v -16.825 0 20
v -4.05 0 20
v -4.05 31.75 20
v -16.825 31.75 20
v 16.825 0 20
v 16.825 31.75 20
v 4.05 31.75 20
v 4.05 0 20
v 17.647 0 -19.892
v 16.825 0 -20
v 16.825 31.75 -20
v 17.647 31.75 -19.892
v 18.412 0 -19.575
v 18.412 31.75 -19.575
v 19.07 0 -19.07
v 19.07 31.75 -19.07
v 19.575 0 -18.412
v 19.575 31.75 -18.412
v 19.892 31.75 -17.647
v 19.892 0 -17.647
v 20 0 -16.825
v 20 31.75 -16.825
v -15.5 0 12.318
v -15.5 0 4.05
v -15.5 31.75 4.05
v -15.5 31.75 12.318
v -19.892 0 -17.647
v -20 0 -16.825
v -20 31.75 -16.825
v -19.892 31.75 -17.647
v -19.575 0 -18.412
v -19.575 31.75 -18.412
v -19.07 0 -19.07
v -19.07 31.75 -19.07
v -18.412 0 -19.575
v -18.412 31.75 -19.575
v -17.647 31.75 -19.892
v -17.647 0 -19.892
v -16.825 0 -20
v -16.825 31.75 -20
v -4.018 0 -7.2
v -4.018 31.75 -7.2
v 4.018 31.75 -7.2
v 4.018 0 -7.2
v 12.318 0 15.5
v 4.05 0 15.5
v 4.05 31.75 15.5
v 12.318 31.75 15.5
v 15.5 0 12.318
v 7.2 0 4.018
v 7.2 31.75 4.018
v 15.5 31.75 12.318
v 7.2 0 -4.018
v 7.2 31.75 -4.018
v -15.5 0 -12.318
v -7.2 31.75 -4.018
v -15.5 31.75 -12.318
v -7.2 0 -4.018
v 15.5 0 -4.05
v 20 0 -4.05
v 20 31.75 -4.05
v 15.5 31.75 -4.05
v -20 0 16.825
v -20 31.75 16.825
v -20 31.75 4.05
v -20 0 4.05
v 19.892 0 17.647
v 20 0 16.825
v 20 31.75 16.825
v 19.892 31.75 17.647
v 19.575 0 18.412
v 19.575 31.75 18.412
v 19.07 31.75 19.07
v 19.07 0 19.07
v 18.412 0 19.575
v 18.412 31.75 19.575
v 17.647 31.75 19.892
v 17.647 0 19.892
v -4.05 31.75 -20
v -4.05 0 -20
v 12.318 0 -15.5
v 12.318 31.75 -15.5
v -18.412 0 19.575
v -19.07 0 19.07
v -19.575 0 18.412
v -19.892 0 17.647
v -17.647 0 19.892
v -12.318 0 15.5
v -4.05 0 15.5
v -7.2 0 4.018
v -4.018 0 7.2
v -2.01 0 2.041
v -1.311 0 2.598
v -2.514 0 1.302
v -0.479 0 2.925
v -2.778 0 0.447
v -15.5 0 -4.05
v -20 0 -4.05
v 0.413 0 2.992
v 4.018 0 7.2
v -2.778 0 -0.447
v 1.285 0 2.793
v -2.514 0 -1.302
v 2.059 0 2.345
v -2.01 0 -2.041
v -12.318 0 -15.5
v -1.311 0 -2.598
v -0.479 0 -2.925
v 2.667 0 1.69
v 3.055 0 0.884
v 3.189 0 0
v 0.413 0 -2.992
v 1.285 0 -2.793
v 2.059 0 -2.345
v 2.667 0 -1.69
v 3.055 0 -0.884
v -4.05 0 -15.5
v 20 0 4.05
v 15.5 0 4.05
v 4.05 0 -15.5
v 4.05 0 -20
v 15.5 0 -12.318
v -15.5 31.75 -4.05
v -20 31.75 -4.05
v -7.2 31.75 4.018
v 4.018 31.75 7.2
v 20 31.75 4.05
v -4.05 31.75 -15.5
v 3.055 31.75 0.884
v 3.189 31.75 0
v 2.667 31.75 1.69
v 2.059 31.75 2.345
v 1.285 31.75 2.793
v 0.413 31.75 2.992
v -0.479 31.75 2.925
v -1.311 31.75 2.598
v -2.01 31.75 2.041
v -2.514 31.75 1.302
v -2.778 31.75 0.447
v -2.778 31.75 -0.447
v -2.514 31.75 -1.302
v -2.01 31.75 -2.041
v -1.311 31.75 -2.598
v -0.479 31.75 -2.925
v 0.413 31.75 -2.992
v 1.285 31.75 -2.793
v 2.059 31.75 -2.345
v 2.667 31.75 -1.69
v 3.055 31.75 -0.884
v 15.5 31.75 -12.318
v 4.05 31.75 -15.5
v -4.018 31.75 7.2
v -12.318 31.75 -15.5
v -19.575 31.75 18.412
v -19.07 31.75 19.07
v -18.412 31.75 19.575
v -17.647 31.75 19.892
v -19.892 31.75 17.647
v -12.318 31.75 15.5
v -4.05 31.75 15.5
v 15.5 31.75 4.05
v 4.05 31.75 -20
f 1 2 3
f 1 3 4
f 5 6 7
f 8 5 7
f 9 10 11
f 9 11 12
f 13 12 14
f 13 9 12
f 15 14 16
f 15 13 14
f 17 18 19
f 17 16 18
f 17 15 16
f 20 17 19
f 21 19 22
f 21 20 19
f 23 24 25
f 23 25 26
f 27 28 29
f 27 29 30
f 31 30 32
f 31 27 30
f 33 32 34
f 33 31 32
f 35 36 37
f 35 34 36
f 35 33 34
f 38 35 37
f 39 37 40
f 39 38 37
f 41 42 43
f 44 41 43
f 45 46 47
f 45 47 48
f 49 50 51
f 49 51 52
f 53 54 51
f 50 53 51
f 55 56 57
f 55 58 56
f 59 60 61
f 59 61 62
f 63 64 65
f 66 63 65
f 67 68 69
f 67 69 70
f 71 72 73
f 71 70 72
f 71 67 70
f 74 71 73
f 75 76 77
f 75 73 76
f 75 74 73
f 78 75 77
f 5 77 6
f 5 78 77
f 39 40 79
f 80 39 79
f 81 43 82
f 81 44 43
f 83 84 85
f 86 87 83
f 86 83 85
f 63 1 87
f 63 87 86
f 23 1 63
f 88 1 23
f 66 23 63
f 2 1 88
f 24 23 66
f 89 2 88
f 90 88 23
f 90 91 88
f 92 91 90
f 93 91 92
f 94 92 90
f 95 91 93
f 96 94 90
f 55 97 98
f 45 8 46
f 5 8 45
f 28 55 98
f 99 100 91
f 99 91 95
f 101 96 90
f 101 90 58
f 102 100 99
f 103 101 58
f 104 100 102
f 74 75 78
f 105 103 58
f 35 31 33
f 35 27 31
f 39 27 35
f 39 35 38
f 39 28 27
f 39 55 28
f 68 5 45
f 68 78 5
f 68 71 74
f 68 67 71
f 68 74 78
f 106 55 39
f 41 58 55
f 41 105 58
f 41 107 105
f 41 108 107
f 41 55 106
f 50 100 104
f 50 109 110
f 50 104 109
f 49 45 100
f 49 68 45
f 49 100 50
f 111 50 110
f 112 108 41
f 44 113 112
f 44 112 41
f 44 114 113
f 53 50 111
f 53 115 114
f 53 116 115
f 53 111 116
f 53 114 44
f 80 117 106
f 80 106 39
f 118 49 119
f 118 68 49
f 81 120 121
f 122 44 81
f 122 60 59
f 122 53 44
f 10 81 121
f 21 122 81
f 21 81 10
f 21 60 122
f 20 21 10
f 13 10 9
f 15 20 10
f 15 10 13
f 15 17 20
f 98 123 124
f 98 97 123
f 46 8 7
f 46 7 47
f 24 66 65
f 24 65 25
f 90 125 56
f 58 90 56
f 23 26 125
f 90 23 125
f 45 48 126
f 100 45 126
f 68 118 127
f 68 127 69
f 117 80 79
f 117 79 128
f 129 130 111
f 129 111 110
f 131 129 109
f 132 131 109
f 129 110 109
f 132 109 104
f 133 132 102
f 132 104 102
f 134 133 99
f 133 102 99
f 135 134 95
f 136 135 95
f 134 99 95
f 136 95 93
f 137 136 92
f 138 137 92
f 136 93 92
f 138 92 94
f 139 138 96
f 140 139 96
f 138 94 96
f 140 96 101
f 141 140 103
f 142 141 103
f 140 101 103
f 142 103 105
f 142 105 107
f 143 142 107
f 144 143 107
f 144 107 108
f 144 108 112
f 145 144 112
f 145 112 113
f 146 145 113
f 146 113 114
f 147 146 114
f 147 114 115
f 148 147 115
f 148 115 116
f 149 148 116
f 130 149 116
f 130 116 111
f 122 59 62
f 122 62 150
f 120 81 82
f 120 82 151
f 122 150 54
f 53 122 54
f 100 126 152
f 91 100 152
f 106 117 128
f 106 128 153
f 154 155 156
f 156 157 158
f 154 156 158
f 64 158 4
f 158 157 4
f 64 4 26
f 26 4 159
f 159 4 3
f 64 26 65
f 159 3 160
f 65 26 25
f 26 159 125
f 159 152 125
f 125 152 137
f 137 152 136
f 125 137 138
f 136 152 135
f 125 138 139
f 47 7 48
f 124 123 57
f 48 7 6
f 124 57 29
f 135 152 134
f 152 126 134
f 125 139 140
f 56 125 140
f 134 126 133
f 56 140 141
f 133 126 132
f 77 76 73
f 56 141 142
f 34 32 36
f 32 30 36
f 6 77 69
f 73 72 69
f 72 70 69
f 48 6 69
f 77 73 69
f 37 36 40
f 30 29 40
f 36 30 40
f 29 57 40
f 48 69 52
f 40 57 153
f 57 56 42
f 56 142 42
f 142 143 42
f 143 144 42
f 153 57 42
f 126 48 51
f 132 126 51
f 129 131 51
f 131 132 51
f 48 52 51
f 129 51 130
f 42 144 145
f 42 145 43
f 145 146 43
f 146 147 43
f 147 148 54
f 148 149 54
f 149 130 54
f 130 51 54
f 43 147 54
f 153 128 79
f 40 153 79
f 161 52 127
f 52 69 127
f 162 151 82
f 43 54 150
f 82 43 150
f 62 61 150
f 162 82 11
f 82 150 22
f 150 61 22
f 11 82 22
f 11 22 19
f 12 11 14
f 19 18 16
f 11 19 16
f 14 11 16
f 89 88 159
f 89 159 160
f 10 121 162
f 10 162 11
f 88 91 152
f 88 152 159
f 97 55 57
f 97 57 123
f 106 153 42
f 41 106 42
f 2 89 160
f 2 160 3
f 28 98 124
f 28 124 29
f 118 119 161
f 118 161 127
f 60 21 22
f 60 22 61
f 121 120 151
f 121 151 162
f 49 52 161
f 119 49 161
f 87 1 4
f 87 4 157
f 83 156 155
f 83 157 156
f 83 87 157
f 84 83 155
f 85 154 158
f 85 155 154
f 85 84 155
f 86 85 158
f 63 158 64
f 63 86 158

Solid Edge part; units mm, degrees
sketch "Sketch1" plane through (0, 0, 0) normal (0, -1, 0) x (1, 0, 0)
  line L0 (-16.825, -20) -> (-4.05, -20)
  line L1 (-4.05, -20) -> (-4.05, -15.5)
  line L2 (-4.05, -15.5) -> (-12.318, -15.5)
  line L3 (-12.318, -15.5) -> (-4.018, -7.2)
  line L4 (-4.018, -7.2) -> (4.018, -7.2)
  line L5 (4.018, -7.2) -> (12.318, -15.5)
  line L6 (12.318, -15.5) -> (4.05, -15.5)
  line L7 (4.05, -15.5) -> (4.05, -20)
  line L8 (4.05, -20) -> (16.825, -20)
  arc A0 (20, -16.825) -> (16.825, -20) centre (16.825, -16.825) cw
  line L9 (20, -16.825) -> (20, -4.0502)
  line L10 (20, -4.0502) -> (15.5, -4.0502)
  line L11 (15.5, -4.0502) -> (15.5, -12.318)
  line L12 (15.5, -12.318) -> (7.2, -4.018)
  line L13 (7.2, -4.018) -> (7.2, 4.018)
  line L14 (7.2, 4.018) -> (15.5, 12.318)
  line L15 (15.5, 12.318) -> (15.5, 4.0498)
  line L16 (15.5, 4.0498) -> (20, 4.0498)
  line L17 (20, 4.0498) -> (20, 16.825)
  arc A1 (16.825, 20) -> (20, 16.825) centre (16.825, 16.825) cw
  line L18 (16.825, 20) -> (4.05, 20)
  line L19 (4.05, 20) -> (4.05, 15.5)
  line L20 (4.05, 15.5) -> (12.318, 15.5)
  line L21 (12.318, 15.5) -> (4.018, 7.2)
  line L22 (4.018, 7.2) -> (-4.018, 7.2)
  line L23 (-4.018, 7.2) -> (-12.318, 15.5)
  line L24 (-12.318, 15.5) -> (-4.05, 15.5)
  line L25 (-4.05, 15.5) -> (-4.05, 20)
  line L26 (-4.05, 20) -> (-16.825, 20)
  arc A2 (-20, 16.825) -> (-16.825, 20) centre (-16.825, 16.825) cw
  line L27 (-20, 16.825) -> (-20, 4.05)
  line L28 (-20, 4.05) -> (-15.5, 4.05)
  line L29 (-15.5, 4.05) -> (-15.5, 12.318)
  line L30 (-15.5, 12.318) -> (-7.2, 4.018)
  line L31 (-7.2, 4.018) -> (-7.2, -4.018)
  line L32 (-7.2, -4.018) -> (-15.5, -12.318)
  line L33 (-15.5, -12.318) -> (-15.5, -4.05)
  line L34 (-15.5, -4.05) -> (-20, -4.05)
  line L35 (-20, -4.05) -> (-20, -16.825)
  arc A3 (-16.825, -20) -> (-20, -16.825) centre (-16.825, -16.825) cw
  circle A4 centre (0.1887, 0) radius 3
extrude "Protrusion1" add sketch "Sketch1" against normal blind 31.75
